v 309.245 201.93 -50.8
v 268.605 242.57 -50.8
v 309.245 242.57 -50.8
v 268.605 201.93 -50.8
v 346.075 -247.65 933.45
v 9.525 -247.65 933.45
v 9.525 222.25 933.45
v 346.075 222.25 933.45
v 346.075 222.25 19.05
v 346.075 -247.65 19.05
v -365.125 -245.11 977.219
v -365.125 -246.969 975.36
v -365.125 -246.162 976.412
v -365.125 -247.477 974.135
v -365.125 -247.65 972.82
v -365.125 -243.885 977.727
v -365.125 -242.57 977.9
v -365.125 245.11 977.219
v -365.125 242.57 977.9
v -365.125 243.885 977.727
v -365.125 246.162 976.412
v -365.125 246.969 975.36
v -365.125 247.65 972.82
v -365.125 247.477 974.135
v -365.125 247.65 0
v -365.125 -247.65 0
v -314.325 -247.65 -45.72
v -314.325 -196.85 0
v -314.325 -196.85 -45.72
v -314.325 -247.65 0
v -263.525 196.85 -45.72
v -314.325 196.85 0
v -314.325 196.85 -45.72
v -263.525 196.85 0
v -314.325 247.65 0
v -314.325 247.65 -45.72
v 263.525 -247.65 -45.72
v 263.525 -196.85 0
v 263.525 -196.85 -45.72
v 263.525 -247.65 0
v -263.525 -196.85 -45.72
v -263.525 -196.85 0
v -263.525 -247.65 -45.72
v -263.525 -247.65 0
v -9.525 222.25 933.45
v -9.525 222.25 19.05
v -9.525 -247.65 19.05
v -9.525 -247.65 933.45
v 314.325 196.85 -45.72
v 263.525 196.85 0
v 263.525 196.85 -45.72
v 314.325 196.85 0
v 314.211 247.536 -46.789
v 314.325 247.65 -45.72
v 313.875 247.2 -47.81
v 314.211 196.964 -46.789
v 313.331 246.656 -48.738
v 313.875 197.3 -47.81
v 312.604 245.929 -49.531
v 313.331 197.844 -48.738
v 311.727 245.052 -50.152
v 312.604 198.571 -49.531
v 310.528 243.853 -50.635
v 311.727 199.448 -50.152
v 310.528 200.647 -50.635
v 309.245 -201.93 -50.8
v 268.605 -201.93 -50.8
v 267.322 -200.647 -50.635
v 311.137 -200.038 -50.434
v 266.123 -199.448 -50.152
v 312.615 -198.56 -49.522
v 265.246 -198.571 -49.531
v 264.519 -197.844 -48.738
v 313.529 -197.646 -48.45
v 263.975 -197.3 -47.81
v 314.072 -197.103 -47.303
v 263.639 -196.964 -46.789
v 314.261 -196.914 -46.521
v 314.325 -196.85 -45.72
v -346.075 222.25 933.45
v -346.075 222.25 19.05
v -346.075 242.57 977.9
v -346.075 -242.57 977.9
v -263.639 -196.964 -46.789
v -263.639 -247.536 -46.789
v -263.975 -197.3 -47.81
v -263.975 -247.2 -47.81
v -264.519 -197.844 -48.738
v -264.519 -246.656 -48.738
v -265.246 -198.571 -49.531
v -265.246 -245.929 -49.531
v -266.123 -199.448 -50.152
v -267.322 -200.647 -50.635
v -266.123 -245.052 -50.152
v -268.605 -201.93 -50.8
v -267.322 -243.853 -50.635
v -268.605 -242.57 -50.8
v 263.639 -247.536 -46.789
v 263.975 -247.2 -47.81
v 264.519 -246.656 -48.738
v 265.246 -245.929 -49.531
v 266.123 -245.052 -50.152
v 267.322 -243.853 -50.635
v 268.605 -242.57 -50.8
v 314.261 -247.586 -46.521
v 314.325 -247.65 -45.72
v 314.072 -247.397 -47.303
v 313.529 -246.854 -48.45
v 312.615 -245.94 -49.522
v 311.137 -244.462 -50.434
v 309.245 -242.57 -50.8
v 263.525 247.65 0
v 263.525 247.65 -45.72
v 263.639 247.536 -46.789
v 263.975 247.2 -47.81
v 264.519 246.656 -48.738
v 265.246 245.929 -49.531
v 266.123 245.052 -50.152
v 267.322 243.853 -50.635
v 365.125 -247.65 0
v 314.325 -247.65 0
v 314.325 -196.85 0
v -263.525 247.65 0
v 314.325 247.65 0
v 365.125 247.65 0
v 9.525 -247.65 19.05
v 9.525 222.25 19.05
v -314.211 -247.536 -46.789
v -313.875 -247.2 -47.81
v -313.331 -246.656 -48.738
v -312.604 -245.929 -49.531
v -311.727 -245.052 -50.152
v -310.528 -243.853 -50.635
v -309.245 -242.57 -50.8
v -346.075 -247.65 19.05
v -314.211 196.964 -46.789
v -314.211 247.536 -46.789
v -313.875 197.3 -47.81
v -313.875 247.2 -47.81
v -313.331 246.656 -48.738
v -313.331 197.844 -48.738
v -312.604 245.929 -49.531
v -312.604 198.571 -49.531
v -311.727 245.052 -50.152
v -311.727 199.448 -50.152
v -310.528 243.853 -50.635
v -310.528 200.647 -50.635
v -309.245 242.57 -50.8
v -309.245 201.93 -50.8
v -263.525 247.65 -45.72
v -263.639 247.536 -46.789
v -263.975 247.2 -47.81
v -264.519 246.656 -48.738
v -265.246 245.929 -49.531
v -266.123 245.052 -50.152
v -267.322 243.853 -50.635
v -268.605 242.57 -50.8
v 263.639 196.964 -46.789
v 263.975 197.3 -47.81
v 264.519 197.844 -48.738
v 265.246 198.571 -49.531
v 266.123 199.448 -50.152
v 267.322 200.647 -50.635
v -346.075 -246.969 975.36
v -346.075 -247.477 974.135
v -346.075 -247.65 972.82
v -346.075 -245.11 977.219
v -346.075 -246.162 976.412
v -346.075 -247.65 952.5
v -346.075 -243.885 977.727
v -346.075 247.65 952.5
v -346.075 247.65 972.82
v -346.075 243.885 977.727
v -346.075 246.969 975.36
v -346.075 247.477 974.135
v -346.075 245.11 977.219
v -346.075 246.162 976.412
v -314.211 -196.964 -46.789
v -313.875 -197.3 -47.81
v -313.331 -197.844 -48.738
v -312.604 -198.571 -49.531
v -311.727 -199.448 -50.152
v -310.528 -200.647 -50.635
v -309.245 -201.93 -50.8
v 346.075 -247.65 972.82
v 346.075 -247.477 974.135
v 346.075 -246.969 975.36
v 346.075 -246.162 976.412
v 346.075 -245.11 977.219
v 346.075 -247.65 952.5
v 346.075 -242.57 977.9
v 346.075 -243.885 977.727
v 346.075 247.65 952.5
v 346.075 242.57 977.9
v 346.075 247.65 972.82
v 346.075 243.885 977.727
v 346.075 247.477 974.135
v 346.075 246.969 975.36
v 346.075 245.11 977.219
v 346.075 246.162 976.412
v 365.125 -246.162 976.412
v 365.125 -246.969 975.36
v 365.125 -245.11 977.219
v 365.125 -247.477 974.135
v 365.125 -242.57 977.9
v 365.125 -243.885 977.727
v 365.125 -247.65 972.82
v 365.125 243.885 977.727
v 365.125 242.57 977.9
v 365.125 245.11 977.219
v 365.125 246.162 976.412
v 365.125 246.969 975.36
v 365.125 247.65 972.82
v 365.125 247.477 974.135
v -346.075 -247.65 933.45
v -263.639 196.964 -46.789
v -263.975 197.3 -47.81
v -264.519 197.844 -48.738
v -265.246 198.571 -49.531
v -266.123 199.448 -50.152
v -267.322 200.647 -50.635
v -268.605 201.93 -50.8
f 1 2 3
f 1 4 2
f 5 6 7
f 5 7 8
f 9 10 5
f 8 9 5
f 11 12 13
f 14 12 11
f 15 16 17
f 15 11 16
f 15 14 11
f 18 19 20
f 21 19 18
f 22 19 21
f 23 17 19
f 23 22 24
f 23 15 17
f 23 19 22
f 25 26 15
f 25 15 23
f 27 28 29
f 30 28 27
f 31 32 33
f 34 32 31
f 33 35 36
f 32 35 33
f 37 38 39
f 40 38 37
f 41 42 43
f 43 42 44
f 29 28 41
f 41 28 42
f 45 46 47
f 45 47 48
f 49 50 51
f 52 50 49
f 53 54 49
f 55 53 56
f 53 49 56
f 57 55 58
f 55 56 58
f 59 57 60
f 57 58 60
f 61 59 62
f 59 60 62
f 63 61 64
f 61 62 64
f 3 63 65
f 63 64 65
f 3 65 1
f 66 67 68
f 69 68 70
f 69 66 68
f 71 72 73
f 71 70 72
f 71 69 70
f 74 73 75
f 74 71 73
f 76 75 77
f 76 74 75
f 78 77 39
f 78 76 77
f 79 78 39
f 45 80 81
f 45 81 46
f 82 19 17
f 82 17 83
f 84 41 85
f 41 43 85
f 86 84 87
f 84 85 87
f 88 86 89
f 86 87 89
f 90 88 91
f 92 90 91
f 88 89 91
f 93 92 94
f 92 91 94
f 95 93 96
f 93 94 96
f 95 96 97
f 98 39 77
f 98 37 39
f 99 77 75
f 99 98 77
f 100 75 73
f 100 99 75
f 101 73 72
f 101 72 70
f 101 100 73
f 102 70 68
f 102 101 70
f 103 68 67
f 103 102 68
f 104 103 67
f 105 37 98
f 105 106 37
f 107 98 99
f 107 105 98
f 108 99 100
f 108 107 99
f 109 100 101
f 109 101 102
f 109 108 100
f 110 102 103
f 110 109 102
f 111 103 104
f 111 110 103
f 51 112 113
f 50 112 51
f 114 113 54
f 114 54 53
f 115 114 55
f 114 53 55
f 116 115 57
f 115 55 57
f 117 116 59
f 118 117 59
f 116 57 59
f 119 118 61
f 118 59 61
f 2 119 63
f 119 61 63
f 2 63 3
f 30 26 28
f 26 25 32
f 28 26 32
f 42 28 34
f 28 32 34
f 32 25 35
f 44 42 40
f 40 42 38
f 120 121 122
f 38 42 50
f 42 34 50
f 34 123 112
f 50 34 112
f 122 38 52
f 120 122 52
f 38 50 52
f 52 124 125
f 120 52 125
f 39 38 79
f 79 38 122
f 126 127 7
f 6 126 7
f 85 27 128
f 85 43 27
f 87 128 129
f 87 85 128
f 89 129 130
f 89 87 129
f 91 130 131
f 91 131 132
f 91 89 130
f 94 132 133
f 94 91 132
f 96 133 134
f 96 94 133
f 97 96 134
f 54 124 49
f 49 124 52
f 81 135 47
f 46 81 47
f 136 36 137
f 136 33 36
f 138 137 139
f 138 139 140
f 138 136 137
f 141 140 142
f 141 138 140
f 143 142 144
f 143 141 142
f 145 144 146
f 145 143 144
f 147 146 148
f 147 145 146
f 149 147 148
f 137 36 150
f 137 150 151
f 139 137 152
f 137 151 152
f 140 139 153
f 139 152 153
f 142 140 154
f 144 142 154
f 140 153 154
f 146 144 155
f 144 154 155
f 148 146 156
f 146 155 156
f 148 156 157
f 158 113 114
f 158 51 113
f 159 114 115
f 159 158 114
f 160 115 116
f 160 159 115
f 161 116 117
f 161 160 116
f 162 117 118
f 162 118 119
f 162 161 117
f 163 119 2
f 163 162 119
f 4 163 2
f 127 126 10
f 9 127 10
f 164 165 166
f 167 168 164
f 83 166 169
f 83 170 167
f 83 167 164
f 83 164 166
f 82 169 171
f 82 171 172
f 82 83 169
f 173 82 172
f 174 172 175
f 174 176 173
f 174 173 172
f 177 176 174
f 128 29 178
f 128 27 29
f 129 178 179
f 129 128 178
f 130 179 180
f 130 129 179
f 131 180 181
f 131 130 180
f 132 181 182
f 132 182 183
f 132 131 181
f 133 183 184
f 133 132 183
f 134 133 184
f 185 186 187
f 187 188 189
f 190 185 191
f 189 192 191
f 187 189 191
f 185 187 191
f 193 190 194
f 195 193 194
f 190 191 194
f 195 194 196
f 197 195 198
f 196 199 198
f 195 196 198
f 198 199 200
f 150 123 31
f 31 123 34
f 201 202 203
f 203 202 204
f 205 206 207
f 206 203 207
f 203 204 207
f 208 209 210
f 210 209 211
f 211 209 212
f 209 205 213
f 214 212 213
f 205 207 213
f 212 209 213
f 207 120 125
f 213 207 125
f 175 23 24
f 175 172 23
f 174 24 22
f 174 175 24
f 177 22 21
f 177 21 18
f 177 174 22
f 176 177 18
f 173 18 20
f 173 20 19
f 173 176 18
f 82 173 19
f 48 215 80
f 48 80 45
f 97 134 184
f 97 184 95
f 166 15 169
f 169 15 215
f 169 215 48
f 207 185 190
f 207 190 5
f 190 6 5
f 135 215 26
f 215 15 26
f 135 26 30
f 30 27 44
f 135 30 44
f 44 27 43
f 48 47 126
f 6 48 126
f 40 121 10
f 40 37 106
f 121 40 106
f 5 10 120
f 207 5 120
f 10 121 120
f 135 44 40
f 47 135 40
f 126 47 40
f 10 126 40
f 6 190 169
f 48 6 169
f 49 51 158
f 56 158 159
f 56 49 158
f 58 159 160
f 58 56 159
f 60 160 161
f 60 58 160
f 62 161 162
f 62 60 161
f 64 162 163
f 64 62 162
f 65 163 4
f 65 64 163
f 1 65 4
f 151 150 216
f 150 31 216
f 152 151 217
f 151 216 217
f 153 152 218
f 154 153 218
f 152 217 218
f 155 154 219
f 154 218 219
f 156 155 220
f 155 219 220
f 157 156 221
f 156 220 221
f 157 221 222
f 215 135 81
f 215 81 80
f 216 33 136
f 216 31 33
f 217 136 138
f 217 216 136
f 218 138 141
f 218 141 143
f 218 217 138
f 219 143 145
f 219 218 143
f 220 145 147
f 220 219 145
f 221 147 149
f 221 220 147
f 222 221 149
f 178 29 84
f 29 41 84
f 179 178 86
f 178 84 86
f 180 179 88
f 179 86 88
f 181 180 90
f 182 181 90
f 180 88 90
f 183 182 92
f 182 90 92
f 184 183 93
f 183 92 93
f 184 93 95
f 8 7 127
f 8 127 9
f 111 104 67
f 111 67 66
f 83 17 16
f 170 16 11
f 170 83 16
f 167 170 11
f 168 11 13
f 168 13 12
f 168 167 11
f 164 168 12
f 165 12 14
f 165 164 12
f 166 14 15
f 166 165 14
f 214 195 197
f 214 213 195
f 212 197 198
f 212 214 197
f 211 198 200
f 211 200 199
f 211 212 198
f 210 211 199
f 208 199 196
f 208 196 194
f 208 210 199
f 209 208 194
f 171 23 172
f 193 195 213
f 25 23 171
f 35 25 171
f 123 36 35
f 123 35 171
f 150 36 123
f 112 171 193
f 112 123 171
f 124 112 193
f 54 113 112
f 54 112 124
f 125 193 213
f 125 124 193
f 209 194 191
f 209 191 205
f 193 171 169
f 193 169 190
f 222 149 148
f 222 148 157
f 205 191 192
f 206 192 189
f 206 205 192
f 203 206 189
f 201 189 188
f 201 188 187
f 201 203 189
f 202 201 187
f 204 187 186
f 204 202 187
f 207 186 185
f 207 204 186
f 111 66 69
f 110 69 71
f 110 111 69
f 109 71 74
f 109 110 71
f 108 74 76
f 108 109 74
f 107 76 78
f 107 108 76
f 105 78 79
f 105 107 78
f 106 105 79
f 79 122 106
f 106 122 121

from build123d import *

# Parameters (mm, degrees)
F0_W     = 730.25
F0_H     = 495.3
F1_DEPTH = 977.9
F2_W     = 692.15
F2_H     = 495.3
F3_DEPTH = 25.4
F4_W     = 692.15
F4_H     = 914.4
F5_DEPTH = 469.9
F6_W     = 19.05
F6_H     = 914.4
F7_DEPTH = 469.9
F8_W     = 50.8
F8_H     = 50.8
F9_DEPTH = 50.8
F10_R    = 5.08
F11_R    = 5.08
F12_R    = 5.08
F13_R    = 5.08


with BuildPart() as f1:
    # F0 (on Top) → F1 (new body)
    with BuildSketch(Plane.XY):
        Rectangle(F0_W, F0_H)
    extrude(amount=F1_DEPTH)

    # F2 (on face) → F3 (cut)
    with BuildSketch(Plane.XY.offset(977.9)):
        Rectangle(F2_W, F2_H)
    extrude(amount=-F3_DEPTH, mode=Mode.SUBTRACT)

    # F4 (on face) → F5 (cut)
    with BuildSketch(Plane.XZ.offset(247.65)):
        with Locations((0, 476.25)):
            Rectangle(F4_W, F4_H)
    extrude(amount=-F5_DEPTH, mode=Mode.SUBTRACT)

    # F6 (on face) → F7 (join)
    with BuildSketch(Plane.XZ.offset(-222.25)):
        with Locations((0, 476.25)):
            Rectangle(F6_W, F6_H)
    extrude(amount=F7_DEPTH)

    # F8 (on face) → F9 (join)
    with BuildSketch(Plane(origin=(0, 0, 0), x_dir=(1, 0, 0), z_dir=(0, 0, -1))):
        with Locations((288.925, 222.25)):
            Rectangle(F8_W, F8_H)
        with Locations((288.925, -222.25)):
            Rectangle(F8_W, F8_H)
        with Locations((-288.925, -222.25)):
            Rectangle(F8_W, F8_H)
        with Locations((-288.925, 222.25)):
            Rectangle(F8_W, F8_H)
    extrude(amount=F9_DEPTH)

    # F10
    f10_edges = [f1.edges().sort_by_distance(p)[0] for p in [
        (-263.525, -222.25, -50.8),
        (-288.925, -196.85, -50.8),
        (-288.925, -247.65, -50.8),
        (-314.325, -222.25, -50.8),
        (-314.325, 222.25, -50.8),
        (-288.925, 196.85, -50.8),
        (-263.525, 222.25, -50.8),
        (-288.925, 247.65, -50.8),
    ]]
    fillet(f10_edges, radius=F10_R)

    # F11
    f11_edges = [f1.edges().sort_by_distance(p)[0] for p in [
        (314.325, -222.25, -50.8),
        (288.925, -247.65, -50.8),
        (263.525, -222.25, -50.8),
        (288.925, -196.85, -50.8),
    ]]
    fillet(f11_edges, radius=F11_R)

    # F12
    f12_edges = [f1.edges().sort_by_distance(p)[0] for p in [
        (288.925, 247.65, -50.8),
        (314.325, 222.25, -50.8),
        (288.925, 196.85, -50.8),
        (263.525, 222.25, -50.8),
    ]]
    fillet(f12_edges, radius=F12_R)

    # F13
    f13_edges = [f1.edges().sort_by_distance(p)[0] for p in [
        (355.6, -247.65, 977.9),
        (-355.6, -247.65, 977.9),
        (355.6, 247.65, 977.9),
        (-355.6, 247.65, 977.9),
    ]]
    fillet(f13_edges, radius=F13_R)


solid = f1.part
